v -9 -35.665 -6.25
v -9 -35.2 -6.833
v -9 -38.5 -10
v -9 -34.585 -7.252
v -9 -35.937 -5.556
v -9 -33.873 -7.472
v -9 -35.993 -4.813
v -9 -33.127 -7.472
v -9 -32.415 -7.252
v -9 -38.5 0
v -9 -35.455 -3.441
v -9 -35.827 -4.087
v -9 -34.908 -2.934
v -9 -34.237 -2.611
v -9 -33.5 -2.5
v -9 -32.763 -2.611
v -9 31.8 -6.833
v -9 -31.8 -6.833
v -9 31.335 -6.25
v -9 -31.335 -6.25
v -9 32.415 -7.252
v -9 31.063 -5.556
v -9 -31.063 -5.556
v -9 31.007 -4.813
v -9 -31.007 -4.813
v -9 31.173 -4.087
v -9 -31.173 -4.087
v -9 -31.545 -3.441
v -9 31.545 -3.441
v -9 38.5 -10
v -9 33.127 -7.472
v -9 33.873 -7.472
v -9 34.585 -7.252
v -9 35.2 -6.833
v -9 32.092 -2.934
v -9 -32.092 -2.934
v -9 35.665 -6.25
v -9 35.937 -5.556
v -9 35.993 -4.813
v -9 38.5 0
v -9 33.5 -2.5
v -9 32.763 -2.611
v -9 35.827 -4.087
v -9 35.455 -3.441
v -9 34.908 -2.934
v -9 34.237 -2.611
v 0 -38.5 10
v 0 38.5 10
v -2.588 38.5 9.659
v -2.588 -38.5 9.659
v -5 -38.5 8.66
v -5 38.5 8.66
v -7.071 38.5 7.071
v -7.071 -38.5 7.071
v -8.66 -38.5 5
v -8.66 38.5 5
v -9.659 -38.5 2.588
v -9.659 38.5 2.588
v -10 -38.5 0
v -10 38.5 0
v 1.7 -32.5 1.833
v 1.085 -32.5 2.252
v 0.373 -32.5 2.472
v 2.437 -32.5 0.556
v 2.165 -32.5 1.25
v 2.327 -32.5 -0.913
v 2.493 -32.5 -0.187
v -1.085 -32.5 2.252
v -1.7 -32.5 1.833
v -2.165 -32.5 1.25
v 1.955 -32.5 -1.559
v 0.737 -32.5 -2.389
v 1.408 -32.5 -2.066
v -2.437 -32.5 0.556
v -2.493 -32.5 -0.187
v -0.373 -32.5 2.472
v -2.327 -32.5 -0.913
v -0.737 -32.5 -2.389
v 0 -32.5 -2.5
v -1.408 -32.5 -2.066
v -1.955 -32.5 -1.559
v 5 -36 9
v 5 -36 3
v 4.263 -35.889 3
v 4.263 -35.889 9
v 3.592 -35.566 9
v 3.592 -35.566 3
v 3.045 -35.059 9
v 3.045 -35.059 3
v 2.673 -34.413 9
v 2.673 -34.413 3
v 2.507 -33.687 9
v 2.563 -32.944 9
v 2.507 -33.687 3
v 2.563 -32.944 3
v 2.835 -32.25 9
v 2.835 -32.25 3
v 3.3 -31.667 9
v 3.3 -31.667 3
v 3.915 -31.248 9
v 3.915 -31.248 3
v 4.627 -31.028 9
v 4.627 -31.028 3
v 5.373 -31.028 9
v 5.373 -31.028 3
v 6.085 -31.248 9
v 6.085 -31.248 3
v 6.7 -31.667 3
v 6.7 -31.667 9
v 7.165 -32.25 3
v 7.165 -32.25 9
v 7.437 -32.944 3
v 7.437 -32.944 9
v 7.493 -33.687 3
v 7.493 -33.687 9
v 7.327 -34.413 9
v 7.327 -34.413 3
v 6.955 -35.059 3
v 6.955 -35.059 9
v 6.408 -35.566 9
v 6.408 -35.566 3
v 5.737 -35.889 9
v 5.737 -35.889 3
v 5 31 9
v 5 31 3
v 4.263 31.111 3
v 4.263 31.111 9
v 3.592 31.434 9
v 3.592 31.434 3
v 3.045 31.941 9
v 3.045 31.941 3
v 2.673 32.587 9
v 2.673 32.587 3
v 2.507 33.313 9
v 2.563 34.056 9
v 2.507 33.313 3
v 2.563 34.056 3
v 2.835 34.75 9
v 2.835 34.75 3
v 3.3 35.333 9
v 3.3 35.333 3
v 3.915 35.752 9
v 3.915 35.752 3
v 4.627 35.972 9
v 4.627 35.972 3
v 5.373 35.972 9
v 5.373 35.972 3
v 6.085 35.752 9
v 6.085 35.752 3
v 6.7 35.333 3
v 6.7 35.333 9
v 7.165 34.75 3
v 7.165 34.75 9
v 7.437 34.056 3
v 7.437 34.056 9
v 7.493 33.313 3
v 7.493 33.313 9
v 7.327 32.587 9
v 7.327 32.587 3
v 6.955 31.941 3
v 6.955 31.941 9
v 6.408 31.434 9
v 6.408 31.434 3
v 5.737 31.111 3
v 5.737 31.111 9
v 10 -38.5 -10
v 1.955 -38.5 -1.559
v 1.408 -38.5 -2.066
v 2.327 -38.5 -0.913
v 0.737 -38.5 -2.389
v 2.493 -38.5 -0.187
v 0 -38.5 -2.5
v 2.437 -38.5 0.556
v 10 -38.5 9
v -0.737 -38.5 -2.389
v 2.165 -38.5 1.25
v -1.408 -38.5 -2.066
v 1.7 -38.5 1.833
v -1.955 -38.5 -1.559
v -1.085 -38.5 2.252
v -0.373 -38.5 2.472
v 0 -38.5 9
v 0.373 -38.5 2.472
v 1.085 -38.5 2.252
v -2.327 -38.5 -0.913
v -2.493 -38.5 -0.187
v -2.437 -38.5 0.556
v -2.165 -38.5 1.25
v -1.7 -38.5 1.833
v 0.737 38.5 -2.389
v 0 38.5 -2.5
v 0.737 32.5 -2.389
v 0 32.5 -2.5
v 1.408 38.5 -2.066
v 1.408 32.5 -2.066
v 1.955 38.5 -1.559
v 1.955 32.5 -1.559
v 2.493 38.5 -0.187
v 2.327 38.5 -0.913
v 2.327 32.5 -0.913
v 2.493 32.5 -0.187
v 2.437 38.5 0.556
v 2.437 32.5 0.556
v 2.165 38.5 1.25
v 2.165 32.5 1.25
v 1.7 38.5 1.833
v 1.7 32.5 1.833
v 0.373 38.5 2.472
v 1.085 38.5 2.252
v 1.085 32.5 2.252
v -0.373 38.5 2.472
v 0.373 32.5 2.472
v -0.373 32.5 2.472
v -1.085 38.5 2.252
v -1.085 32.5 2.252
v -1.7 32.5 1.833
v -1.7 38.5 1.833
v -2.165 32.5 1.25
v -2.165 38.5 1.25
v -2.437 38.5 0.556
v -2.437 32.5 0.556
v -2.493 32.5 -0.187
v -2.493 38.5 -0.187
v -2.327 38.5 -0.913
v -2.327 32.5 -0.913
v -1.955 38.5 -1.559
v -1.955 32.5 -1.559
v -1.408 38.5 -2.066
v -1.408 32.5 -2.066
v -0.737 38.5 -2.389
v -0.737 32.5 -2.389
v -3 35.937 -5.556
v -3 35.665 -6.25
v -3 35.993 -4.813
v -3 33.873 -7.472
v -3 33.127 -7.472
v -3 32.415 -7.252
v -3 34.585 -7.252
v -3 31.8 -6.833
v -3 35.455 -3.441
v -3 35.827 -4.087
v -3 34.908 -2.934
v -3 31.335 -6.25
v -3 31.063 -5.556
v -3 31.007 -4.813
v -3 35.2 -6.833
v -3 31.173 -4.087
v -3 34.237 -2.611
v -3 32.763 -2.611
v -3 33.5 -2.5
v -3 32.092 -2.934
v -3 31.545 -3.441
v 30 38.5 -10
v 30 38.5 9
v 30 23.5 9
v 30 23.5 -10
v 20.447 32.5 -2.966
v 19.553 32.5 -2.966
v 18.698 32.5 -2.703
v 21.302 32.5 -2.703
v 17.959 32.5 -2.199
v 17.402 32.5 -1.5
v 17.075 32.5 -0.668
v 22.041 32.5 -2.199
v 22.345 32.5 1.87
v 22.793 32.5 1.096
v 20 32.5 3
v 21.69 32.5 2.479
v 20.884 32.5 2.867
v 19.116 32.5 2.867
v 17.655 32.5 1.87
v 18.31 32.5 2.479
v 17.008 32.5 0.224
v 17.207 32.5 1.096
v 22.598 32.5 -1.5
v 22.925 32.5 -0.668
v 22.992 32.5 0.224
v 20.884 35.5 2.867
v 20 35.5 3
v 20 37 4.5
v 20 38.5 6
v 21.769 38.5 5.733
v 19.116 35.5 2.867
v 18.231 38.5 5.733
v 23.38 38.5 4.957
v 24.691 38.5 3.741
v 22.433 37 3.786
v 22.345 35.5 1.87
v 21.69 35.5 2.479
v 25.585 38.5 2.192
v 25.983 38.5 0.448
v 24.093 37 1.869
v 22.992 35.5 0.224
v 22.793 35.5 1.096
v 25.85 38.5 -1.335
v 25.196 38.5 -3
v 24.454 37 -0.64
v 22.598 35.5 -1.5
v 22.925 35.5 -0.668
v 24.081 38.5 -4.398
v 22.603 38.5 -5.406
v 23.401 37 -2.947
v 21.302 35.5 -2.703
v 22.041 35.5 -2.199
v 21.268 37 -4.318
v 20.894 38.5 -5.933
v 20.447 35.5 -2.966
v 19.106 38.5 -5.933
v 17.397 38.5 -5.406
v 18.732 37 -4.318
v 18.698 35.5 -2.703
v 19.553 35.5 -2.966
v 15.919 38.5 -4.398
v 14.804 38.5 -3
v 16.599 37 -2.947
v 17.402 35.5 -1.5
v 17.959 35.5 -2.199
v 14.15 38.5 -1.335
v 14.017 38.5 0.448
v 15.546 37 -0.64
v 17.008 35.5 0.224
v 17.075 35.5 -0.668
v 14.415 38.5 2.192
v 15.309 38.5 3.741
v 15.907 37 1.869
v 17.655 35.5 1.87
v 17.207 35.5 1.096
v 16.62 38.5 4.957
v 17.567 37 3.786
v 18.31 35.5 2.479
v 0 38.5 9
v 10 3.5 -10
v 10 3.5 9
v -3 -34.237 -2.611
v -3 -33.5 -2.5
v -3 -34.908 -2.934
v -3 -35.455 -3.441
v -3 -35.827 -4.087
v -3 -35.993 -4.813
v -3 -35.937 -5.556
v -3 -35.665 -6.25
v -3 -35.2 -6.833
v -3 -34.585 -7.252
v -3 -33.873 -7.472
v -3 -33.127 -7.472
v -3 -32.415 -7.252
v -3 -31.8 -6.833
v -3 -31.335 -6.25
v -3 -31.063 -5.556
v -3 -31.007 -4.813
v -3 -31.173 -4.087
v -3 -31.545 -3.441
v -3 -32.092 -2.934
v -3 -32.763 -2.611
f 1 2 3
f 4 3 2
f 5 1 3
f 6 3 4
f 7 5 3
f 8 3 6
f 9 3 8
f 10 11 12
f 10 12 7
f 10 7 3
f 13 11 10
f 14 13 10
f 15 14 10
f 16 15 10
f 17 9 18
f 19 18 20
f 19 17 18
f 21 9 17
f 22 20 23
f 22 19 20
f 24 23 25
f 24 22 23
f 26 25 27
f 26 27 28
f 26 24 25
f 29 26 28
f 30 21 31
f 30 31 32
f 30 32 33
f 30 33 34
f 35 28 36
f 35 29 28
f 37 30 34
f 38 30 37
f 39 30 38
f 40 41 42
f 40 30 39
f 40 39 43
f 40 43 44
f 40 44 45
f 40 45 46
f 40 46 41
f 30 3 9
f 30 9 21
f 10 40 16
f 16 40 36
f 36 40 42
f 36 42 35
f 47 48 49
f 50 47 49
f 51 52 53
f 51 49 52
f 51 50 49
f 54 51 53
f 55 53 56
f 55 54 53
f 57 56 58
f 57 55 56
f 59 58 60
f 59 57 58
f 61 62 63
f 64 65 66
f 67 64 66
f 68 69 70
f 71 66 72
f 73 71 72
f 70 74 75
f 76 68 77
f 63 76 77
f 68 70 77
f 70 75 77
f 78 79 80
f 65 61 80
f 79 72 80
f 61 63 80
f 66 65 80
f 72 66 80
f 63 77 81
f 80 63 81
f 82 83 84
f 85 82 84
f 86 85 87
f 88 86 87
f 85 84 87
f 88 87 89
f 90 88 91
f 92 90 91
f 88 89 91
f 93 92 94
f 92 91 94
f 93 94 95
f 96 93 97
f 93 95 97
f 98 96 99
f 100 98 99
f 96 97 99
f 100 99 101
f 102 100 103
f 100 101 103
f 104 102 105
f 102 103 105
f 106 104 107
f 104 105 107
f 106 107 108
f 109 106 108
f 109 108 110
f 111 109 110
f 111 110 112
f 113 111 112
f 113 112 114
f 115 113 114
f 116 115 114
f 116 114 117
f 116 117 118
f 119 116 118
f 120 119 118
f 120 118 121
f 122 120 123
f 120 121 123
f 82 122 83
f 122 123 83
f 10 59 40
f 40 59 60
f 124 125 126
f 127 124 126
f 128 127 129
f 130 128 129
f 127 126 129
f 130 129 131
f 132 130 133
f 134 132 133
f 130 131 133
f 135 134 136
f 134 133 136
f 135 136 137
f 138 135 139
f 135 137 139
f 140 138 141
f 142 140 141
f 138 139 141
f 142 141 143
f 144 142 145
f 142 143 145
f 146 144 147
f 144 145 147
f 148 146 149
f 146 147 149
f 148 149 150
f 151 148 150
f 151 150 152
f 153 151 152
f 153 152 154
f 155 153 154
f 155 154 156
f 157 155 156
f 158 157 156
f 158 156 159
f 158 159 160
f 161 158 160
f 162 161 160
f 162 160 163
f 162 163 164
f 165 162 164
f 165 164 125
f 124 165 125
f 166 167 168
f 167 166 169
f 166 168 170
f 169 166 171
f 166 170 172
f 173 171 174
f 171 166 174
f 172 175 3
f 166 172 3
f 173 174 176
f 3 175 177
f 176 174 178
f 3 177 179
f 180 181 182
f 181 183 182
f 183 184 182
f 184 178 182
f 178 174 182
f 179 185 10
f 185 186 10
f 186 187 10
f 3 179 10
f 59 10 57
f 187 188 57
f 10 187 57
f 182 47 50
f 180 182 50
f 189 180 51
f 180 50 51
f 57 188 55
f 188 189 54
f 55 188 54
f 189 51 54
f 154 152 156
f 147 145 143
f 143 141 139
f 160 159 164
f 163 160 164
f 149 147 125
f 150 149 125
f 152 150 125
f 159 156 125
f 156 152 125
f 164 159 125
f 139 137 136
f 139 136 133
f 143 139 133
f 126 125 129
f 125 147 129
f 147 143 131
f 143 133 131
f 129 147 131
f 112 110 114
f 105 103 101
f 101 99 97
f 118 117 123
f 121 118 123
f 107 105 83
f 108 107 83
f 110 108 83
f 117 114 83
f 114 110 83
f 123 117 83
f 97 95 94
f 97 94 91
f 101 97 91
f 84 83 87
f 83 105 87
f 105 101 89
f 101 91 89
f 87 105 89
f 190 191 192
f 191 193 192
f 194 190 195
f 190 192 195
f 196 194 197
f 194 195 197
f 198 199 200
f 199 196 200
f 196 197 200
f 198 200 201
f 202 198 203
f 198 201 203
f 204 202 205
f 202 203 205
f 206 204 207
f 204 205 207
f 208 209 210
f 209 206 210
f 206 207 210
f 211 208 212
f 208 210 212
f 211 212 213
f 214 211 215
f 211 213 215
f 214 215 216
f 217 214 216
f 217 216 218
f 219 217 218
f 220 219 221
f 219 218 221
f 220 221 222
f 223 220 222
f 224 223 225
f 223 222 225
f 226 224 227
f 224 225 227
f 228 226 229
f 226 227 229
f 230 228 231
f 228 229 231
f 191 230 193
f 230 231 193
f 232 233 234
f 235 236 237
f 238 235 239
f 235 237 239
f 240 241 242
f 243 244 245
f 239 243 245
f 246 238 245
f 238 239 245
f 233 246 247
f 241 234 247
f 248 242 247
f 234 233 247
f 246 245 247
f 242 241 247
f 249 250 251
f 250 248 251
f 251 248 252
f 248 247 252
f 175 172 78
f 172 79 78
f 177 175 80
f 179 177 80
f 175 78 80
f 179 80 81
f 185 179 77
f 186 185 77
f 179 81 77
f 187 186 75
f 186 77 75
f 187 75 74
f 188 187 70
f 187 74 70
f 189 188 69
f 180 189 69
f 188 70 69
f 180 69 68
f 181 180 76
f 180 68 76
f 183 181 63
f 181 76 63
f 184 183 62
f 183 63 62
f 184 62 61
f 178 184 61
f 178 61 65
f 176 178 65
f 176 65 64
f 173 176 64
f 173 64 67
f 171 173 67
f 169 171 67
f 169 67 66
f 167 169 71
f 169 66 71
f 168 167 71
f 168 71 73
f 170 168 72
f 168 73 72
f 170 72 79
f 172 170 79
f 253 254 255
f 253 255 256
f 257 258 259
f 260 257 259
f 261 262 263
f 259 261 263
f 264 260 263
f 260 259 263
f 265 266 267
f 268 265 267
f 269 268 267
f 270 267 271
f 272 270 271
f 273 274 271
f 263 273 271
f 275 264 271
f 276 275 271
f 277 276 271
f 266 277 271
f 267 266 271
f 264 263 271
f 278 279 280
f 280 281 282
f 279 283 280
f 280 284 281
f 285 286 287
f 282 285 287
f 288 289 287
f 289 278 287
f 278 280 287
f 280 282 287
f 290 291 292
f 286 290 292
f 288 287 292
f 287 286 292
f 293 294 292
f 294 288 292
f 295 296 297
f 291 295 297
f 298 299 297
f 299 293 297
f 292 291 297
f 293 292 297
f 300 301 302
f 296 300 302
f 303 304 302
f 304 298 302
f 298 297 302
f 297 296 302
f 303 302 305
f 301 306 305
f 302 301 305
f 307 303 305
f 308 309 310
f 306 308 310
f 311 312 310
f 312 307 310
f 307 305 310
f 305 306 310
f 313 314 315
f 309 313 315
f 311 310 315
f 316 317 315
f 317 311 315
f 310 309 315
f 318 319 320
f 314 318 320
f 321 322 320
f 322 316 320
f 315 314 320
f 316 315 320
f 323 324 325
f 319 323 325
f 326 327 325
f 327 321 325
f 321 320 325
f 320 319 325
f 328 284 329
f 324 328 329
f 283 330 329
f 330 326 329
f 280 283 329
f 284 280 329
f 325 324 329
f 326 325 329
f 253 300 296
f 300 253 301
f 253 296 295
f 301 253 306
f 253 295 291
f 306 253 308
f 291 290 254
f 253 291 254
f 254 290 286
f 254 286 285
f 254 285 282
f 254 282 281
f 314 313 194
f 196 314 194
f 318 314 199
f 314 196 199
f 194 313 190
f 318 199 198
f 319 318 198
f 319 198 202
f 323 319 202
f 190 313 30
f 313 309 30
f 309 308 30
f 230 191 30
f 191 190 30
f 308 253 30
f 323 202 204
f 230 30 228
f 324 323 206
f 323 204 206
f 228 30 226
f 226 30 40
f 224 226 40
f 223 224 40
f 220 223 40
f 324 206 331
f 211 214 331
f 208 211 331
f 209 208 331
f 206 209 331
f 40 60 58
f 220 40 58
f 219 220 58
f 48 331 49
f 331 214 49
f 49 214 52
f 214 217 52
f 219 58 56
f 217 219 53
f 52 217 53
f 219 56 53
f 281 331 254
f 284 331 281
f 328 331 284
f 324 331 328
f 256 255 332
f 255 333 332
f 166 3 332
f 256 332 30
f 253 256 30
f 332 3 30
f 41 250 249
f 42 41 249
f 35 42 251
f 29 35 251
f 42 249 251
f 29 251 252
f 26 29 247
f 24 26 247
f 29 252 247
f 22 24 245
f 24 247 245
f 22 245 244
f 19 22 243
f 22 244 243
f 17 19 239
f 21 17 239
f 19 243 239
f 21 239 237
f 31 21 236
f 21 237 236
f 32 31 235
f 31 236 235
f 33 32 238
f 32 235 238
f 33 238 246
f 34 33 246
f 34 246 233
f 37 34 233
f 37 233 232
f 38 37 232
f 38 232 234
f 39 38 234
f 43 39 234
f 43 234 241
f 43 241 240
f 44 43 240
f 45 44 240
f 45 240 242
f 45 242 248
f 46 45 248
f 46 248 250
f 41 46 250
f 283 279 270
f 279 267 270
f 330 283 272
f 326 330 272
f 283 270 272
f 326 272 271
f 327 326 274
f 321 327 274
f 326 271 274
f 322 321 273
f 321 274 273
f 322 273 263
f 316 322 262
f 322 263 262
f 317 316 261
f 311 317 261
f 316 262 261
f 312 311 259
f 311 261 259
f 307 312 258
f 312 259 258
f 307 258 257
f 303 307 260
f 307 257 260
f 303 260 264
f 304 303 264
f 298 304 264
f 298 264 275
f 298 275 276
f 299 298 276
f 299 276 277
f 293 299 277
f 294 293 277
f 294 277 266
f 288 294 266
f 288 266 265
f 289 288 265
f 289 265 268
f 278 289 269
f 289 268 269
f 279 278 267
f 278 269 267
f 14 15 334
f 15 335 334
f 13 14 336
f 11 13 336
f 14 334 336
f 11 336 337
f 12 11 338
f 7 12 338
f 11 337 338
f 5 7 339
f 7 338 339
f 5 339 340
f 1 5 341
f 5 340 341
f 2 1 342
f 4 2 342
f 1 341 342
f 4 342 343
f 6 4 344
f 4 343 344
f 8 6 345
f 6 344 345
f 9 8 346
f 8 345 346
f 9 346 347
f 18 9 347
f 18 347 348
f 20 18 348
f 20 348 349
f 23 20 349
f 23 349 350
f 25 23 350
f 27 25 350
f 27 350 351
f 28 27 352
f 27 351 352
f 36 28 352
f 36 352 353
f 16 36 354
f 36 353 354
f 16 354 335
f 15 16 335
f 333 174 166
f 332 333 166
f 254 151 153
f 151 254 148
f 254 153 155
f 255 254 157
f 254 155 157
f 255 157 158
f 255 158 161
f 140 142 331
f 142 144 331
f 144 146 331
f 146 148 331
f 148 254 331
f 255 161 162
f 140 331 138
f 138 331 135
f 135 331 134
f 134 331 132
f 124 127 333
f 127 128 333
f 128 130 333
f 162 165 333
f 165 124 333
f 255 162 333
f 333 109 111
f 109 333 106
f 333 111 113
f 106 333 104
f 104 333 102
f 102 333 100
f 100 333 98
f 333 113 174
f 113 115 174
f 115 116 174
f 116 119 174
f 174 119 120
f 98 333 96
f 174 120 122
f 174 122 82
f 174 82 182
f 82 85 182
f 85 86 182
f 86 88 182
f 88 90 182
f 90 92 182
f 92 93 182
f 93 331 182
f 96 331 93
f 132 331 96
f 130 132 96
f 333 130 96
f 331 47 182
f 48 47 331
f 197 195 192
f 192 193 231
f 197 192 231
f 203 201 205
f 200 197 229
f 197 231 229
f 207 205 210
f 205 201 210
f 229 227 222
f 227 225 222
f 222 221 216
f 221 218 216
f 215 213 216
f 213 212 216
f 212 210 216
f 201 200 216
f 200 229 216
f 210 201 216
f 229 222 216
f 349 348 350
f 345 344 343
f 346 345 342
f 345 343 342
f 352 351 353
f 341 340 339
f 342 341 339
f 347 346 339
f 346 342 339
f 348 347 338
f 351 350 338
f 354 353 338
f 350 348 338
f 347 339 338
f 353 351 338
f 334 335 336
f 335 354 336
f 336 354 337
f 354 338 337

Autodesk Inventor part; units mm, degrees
ref_plane "YZ Plane" through (0, 0, 0) normal (1, 0, 0) x (0, 1, 0)
ref_plane "XZ Plane" through (0, 0, 0) normal (0, 1, 0) x (-1, 0, 0)
ref_plane "XY Plane" through (0, 0, 0) normal (0, 0, 1) x (1, 0, 0)
sketch "スケッチ1" plane through (0, 0, 0) normal (0, 1, 0) x (-1, 0, 0)
  circle A0 centre (0, 0) radius 10
  line L0 (0, 10) -> (-10, 10)
  line L1 (-10, 10) -> (-10, -10)
  line L2 (-10, -10) -> (10, -10)
  line L3 (10, -10) -> (10, 0)
  dimension "d0" = 20
  dimension "d1" = 10
  dimension "d2" = 10
extrude "押し出し1" add sketch "スケッチ1" along normal mid plane 77
sketch "スケッチ2" plane through (0, -38.5, 10) normal (0, 0, 1) x (1, 0, 0)
  line L0 (10, 0) -> (10, 77) projected
  line L1 (0, 77) -> (10, 77) projected
  line L2 (0, 0) -> (0, 77) projected
  line L3 (10, 0) -> (0, 0) projected
extrude "押し出し2" cut sketch "スケッチ2" against normal blind 1
sketch "スケッチ3" plane through (-10, -38.5, -10) normal (-1, 0, 0) x (0, 0, 1)
  line L0 (0, 77) -> (10, 77) projected
  line L1 (10, 0) -> (10, 77) projected
  line L2 (10, 0) -> (0, 0) projected
  line L3 (0, 0) -> (0, 77) projected
  point P0 (10, 38.5)
extrude "押し出し3" cut sketch "スケッチ3" against normal blind 1
sketch "スケッチ4" plane through (0, -38.5, 9) normal (0, 0, 1) x (1, 0, 0)
  line L0 (0, 77) -> (10, 77) projected
  line L1 (10, 77) -> (10, 0) projected
  line L2 (10, 0) -> (0, 0) projected
  point P0 (0, 38.5)
  point P1 (5, 72)
  point P2 (5, 5)
  dimension "d9" = 5
  dimension "d10" = 5
  dimension "d11" = 5
hole "穴1" at (5, 33.5, 9) at (5, -33.5, 9) direction (0, 0, -1) diameter 5 depth 6
sketch "スケッチ5" plane through (0, -38.5, 0) normal (0, 1, 0) x (1, 0, 0)
  point P0 (0, 0)
hole "穴2" at (0, -38.5, 0) direction (0, 1, 0) diameter 5 depth 6
sketch "スケッチ6" plane through (-9, -38.5, -10) normal (-1, 0, 0) x (0, 0, 1)
  line L0 (0, 0) -> (0, 77) projected
  line L1 (0, 77) -> (10, 77) projected
  line L2 (10, 0) -> (0, 0) projected
  point P0 (10, 38.5)
  point P1 (5, 72)
  point P2 (5, 5)
  dimension "d26" = 5
  dimension "d27" = 5
  dimension "d28" = 5
  dimension "d29" = 5
hole "穴3" at (-9, 33.5, -5) at (-9, -33.5, -5) direction (1, 0, 0) diameter 5 depth 6
mirror "ミラー1" about plane through (0, 0, 0) normal (0, 1, 0) of "穴2"
sketch "スケッチ9" plane through (10, -38.5, -10) normal (1, 0, 0) x (0, 0, -1)
  line L0 (0, 77) -> (-10, 77) projected
  line L1 (-19, 77) -> (-19, 0) projected
  line L2 (0, 77) -> (-19, 77)
  line L3 (-19, 77) -> (-19, 62)
  line L4 (-19, 62) -> (0, 62)
  line L5 (0, 62) -> (0, 77)
  point P0 (-10, 38.5)
  dimension "d47" = 15
extrude "押し出し6" add sketch "スケッチ9" along normal blind 20
sketch "スケッチ10" plane through (0, 38.5, 0) normal (0, 1, 0) x (1, 0, 0)
  line L0 (30, 10) -> (30, -9) projected
  point P0 (0, 0)
  point P1 (20, 0)
  dimension "d50" = 10
hole "穴4" at (20, 38.5, 0) direction (0, -1, 0) diameter 6 depth 6
chamfer "面取り2" distance 3 angle 45 1 edges at (20, 38.5, -3)
chamfer "面取り3" distance 20 angle 45 1 edges at (10, 23.5, -0.5)
equation "\"d11\" = d9"
properties part number "base8" material "ABS プラスチック"
